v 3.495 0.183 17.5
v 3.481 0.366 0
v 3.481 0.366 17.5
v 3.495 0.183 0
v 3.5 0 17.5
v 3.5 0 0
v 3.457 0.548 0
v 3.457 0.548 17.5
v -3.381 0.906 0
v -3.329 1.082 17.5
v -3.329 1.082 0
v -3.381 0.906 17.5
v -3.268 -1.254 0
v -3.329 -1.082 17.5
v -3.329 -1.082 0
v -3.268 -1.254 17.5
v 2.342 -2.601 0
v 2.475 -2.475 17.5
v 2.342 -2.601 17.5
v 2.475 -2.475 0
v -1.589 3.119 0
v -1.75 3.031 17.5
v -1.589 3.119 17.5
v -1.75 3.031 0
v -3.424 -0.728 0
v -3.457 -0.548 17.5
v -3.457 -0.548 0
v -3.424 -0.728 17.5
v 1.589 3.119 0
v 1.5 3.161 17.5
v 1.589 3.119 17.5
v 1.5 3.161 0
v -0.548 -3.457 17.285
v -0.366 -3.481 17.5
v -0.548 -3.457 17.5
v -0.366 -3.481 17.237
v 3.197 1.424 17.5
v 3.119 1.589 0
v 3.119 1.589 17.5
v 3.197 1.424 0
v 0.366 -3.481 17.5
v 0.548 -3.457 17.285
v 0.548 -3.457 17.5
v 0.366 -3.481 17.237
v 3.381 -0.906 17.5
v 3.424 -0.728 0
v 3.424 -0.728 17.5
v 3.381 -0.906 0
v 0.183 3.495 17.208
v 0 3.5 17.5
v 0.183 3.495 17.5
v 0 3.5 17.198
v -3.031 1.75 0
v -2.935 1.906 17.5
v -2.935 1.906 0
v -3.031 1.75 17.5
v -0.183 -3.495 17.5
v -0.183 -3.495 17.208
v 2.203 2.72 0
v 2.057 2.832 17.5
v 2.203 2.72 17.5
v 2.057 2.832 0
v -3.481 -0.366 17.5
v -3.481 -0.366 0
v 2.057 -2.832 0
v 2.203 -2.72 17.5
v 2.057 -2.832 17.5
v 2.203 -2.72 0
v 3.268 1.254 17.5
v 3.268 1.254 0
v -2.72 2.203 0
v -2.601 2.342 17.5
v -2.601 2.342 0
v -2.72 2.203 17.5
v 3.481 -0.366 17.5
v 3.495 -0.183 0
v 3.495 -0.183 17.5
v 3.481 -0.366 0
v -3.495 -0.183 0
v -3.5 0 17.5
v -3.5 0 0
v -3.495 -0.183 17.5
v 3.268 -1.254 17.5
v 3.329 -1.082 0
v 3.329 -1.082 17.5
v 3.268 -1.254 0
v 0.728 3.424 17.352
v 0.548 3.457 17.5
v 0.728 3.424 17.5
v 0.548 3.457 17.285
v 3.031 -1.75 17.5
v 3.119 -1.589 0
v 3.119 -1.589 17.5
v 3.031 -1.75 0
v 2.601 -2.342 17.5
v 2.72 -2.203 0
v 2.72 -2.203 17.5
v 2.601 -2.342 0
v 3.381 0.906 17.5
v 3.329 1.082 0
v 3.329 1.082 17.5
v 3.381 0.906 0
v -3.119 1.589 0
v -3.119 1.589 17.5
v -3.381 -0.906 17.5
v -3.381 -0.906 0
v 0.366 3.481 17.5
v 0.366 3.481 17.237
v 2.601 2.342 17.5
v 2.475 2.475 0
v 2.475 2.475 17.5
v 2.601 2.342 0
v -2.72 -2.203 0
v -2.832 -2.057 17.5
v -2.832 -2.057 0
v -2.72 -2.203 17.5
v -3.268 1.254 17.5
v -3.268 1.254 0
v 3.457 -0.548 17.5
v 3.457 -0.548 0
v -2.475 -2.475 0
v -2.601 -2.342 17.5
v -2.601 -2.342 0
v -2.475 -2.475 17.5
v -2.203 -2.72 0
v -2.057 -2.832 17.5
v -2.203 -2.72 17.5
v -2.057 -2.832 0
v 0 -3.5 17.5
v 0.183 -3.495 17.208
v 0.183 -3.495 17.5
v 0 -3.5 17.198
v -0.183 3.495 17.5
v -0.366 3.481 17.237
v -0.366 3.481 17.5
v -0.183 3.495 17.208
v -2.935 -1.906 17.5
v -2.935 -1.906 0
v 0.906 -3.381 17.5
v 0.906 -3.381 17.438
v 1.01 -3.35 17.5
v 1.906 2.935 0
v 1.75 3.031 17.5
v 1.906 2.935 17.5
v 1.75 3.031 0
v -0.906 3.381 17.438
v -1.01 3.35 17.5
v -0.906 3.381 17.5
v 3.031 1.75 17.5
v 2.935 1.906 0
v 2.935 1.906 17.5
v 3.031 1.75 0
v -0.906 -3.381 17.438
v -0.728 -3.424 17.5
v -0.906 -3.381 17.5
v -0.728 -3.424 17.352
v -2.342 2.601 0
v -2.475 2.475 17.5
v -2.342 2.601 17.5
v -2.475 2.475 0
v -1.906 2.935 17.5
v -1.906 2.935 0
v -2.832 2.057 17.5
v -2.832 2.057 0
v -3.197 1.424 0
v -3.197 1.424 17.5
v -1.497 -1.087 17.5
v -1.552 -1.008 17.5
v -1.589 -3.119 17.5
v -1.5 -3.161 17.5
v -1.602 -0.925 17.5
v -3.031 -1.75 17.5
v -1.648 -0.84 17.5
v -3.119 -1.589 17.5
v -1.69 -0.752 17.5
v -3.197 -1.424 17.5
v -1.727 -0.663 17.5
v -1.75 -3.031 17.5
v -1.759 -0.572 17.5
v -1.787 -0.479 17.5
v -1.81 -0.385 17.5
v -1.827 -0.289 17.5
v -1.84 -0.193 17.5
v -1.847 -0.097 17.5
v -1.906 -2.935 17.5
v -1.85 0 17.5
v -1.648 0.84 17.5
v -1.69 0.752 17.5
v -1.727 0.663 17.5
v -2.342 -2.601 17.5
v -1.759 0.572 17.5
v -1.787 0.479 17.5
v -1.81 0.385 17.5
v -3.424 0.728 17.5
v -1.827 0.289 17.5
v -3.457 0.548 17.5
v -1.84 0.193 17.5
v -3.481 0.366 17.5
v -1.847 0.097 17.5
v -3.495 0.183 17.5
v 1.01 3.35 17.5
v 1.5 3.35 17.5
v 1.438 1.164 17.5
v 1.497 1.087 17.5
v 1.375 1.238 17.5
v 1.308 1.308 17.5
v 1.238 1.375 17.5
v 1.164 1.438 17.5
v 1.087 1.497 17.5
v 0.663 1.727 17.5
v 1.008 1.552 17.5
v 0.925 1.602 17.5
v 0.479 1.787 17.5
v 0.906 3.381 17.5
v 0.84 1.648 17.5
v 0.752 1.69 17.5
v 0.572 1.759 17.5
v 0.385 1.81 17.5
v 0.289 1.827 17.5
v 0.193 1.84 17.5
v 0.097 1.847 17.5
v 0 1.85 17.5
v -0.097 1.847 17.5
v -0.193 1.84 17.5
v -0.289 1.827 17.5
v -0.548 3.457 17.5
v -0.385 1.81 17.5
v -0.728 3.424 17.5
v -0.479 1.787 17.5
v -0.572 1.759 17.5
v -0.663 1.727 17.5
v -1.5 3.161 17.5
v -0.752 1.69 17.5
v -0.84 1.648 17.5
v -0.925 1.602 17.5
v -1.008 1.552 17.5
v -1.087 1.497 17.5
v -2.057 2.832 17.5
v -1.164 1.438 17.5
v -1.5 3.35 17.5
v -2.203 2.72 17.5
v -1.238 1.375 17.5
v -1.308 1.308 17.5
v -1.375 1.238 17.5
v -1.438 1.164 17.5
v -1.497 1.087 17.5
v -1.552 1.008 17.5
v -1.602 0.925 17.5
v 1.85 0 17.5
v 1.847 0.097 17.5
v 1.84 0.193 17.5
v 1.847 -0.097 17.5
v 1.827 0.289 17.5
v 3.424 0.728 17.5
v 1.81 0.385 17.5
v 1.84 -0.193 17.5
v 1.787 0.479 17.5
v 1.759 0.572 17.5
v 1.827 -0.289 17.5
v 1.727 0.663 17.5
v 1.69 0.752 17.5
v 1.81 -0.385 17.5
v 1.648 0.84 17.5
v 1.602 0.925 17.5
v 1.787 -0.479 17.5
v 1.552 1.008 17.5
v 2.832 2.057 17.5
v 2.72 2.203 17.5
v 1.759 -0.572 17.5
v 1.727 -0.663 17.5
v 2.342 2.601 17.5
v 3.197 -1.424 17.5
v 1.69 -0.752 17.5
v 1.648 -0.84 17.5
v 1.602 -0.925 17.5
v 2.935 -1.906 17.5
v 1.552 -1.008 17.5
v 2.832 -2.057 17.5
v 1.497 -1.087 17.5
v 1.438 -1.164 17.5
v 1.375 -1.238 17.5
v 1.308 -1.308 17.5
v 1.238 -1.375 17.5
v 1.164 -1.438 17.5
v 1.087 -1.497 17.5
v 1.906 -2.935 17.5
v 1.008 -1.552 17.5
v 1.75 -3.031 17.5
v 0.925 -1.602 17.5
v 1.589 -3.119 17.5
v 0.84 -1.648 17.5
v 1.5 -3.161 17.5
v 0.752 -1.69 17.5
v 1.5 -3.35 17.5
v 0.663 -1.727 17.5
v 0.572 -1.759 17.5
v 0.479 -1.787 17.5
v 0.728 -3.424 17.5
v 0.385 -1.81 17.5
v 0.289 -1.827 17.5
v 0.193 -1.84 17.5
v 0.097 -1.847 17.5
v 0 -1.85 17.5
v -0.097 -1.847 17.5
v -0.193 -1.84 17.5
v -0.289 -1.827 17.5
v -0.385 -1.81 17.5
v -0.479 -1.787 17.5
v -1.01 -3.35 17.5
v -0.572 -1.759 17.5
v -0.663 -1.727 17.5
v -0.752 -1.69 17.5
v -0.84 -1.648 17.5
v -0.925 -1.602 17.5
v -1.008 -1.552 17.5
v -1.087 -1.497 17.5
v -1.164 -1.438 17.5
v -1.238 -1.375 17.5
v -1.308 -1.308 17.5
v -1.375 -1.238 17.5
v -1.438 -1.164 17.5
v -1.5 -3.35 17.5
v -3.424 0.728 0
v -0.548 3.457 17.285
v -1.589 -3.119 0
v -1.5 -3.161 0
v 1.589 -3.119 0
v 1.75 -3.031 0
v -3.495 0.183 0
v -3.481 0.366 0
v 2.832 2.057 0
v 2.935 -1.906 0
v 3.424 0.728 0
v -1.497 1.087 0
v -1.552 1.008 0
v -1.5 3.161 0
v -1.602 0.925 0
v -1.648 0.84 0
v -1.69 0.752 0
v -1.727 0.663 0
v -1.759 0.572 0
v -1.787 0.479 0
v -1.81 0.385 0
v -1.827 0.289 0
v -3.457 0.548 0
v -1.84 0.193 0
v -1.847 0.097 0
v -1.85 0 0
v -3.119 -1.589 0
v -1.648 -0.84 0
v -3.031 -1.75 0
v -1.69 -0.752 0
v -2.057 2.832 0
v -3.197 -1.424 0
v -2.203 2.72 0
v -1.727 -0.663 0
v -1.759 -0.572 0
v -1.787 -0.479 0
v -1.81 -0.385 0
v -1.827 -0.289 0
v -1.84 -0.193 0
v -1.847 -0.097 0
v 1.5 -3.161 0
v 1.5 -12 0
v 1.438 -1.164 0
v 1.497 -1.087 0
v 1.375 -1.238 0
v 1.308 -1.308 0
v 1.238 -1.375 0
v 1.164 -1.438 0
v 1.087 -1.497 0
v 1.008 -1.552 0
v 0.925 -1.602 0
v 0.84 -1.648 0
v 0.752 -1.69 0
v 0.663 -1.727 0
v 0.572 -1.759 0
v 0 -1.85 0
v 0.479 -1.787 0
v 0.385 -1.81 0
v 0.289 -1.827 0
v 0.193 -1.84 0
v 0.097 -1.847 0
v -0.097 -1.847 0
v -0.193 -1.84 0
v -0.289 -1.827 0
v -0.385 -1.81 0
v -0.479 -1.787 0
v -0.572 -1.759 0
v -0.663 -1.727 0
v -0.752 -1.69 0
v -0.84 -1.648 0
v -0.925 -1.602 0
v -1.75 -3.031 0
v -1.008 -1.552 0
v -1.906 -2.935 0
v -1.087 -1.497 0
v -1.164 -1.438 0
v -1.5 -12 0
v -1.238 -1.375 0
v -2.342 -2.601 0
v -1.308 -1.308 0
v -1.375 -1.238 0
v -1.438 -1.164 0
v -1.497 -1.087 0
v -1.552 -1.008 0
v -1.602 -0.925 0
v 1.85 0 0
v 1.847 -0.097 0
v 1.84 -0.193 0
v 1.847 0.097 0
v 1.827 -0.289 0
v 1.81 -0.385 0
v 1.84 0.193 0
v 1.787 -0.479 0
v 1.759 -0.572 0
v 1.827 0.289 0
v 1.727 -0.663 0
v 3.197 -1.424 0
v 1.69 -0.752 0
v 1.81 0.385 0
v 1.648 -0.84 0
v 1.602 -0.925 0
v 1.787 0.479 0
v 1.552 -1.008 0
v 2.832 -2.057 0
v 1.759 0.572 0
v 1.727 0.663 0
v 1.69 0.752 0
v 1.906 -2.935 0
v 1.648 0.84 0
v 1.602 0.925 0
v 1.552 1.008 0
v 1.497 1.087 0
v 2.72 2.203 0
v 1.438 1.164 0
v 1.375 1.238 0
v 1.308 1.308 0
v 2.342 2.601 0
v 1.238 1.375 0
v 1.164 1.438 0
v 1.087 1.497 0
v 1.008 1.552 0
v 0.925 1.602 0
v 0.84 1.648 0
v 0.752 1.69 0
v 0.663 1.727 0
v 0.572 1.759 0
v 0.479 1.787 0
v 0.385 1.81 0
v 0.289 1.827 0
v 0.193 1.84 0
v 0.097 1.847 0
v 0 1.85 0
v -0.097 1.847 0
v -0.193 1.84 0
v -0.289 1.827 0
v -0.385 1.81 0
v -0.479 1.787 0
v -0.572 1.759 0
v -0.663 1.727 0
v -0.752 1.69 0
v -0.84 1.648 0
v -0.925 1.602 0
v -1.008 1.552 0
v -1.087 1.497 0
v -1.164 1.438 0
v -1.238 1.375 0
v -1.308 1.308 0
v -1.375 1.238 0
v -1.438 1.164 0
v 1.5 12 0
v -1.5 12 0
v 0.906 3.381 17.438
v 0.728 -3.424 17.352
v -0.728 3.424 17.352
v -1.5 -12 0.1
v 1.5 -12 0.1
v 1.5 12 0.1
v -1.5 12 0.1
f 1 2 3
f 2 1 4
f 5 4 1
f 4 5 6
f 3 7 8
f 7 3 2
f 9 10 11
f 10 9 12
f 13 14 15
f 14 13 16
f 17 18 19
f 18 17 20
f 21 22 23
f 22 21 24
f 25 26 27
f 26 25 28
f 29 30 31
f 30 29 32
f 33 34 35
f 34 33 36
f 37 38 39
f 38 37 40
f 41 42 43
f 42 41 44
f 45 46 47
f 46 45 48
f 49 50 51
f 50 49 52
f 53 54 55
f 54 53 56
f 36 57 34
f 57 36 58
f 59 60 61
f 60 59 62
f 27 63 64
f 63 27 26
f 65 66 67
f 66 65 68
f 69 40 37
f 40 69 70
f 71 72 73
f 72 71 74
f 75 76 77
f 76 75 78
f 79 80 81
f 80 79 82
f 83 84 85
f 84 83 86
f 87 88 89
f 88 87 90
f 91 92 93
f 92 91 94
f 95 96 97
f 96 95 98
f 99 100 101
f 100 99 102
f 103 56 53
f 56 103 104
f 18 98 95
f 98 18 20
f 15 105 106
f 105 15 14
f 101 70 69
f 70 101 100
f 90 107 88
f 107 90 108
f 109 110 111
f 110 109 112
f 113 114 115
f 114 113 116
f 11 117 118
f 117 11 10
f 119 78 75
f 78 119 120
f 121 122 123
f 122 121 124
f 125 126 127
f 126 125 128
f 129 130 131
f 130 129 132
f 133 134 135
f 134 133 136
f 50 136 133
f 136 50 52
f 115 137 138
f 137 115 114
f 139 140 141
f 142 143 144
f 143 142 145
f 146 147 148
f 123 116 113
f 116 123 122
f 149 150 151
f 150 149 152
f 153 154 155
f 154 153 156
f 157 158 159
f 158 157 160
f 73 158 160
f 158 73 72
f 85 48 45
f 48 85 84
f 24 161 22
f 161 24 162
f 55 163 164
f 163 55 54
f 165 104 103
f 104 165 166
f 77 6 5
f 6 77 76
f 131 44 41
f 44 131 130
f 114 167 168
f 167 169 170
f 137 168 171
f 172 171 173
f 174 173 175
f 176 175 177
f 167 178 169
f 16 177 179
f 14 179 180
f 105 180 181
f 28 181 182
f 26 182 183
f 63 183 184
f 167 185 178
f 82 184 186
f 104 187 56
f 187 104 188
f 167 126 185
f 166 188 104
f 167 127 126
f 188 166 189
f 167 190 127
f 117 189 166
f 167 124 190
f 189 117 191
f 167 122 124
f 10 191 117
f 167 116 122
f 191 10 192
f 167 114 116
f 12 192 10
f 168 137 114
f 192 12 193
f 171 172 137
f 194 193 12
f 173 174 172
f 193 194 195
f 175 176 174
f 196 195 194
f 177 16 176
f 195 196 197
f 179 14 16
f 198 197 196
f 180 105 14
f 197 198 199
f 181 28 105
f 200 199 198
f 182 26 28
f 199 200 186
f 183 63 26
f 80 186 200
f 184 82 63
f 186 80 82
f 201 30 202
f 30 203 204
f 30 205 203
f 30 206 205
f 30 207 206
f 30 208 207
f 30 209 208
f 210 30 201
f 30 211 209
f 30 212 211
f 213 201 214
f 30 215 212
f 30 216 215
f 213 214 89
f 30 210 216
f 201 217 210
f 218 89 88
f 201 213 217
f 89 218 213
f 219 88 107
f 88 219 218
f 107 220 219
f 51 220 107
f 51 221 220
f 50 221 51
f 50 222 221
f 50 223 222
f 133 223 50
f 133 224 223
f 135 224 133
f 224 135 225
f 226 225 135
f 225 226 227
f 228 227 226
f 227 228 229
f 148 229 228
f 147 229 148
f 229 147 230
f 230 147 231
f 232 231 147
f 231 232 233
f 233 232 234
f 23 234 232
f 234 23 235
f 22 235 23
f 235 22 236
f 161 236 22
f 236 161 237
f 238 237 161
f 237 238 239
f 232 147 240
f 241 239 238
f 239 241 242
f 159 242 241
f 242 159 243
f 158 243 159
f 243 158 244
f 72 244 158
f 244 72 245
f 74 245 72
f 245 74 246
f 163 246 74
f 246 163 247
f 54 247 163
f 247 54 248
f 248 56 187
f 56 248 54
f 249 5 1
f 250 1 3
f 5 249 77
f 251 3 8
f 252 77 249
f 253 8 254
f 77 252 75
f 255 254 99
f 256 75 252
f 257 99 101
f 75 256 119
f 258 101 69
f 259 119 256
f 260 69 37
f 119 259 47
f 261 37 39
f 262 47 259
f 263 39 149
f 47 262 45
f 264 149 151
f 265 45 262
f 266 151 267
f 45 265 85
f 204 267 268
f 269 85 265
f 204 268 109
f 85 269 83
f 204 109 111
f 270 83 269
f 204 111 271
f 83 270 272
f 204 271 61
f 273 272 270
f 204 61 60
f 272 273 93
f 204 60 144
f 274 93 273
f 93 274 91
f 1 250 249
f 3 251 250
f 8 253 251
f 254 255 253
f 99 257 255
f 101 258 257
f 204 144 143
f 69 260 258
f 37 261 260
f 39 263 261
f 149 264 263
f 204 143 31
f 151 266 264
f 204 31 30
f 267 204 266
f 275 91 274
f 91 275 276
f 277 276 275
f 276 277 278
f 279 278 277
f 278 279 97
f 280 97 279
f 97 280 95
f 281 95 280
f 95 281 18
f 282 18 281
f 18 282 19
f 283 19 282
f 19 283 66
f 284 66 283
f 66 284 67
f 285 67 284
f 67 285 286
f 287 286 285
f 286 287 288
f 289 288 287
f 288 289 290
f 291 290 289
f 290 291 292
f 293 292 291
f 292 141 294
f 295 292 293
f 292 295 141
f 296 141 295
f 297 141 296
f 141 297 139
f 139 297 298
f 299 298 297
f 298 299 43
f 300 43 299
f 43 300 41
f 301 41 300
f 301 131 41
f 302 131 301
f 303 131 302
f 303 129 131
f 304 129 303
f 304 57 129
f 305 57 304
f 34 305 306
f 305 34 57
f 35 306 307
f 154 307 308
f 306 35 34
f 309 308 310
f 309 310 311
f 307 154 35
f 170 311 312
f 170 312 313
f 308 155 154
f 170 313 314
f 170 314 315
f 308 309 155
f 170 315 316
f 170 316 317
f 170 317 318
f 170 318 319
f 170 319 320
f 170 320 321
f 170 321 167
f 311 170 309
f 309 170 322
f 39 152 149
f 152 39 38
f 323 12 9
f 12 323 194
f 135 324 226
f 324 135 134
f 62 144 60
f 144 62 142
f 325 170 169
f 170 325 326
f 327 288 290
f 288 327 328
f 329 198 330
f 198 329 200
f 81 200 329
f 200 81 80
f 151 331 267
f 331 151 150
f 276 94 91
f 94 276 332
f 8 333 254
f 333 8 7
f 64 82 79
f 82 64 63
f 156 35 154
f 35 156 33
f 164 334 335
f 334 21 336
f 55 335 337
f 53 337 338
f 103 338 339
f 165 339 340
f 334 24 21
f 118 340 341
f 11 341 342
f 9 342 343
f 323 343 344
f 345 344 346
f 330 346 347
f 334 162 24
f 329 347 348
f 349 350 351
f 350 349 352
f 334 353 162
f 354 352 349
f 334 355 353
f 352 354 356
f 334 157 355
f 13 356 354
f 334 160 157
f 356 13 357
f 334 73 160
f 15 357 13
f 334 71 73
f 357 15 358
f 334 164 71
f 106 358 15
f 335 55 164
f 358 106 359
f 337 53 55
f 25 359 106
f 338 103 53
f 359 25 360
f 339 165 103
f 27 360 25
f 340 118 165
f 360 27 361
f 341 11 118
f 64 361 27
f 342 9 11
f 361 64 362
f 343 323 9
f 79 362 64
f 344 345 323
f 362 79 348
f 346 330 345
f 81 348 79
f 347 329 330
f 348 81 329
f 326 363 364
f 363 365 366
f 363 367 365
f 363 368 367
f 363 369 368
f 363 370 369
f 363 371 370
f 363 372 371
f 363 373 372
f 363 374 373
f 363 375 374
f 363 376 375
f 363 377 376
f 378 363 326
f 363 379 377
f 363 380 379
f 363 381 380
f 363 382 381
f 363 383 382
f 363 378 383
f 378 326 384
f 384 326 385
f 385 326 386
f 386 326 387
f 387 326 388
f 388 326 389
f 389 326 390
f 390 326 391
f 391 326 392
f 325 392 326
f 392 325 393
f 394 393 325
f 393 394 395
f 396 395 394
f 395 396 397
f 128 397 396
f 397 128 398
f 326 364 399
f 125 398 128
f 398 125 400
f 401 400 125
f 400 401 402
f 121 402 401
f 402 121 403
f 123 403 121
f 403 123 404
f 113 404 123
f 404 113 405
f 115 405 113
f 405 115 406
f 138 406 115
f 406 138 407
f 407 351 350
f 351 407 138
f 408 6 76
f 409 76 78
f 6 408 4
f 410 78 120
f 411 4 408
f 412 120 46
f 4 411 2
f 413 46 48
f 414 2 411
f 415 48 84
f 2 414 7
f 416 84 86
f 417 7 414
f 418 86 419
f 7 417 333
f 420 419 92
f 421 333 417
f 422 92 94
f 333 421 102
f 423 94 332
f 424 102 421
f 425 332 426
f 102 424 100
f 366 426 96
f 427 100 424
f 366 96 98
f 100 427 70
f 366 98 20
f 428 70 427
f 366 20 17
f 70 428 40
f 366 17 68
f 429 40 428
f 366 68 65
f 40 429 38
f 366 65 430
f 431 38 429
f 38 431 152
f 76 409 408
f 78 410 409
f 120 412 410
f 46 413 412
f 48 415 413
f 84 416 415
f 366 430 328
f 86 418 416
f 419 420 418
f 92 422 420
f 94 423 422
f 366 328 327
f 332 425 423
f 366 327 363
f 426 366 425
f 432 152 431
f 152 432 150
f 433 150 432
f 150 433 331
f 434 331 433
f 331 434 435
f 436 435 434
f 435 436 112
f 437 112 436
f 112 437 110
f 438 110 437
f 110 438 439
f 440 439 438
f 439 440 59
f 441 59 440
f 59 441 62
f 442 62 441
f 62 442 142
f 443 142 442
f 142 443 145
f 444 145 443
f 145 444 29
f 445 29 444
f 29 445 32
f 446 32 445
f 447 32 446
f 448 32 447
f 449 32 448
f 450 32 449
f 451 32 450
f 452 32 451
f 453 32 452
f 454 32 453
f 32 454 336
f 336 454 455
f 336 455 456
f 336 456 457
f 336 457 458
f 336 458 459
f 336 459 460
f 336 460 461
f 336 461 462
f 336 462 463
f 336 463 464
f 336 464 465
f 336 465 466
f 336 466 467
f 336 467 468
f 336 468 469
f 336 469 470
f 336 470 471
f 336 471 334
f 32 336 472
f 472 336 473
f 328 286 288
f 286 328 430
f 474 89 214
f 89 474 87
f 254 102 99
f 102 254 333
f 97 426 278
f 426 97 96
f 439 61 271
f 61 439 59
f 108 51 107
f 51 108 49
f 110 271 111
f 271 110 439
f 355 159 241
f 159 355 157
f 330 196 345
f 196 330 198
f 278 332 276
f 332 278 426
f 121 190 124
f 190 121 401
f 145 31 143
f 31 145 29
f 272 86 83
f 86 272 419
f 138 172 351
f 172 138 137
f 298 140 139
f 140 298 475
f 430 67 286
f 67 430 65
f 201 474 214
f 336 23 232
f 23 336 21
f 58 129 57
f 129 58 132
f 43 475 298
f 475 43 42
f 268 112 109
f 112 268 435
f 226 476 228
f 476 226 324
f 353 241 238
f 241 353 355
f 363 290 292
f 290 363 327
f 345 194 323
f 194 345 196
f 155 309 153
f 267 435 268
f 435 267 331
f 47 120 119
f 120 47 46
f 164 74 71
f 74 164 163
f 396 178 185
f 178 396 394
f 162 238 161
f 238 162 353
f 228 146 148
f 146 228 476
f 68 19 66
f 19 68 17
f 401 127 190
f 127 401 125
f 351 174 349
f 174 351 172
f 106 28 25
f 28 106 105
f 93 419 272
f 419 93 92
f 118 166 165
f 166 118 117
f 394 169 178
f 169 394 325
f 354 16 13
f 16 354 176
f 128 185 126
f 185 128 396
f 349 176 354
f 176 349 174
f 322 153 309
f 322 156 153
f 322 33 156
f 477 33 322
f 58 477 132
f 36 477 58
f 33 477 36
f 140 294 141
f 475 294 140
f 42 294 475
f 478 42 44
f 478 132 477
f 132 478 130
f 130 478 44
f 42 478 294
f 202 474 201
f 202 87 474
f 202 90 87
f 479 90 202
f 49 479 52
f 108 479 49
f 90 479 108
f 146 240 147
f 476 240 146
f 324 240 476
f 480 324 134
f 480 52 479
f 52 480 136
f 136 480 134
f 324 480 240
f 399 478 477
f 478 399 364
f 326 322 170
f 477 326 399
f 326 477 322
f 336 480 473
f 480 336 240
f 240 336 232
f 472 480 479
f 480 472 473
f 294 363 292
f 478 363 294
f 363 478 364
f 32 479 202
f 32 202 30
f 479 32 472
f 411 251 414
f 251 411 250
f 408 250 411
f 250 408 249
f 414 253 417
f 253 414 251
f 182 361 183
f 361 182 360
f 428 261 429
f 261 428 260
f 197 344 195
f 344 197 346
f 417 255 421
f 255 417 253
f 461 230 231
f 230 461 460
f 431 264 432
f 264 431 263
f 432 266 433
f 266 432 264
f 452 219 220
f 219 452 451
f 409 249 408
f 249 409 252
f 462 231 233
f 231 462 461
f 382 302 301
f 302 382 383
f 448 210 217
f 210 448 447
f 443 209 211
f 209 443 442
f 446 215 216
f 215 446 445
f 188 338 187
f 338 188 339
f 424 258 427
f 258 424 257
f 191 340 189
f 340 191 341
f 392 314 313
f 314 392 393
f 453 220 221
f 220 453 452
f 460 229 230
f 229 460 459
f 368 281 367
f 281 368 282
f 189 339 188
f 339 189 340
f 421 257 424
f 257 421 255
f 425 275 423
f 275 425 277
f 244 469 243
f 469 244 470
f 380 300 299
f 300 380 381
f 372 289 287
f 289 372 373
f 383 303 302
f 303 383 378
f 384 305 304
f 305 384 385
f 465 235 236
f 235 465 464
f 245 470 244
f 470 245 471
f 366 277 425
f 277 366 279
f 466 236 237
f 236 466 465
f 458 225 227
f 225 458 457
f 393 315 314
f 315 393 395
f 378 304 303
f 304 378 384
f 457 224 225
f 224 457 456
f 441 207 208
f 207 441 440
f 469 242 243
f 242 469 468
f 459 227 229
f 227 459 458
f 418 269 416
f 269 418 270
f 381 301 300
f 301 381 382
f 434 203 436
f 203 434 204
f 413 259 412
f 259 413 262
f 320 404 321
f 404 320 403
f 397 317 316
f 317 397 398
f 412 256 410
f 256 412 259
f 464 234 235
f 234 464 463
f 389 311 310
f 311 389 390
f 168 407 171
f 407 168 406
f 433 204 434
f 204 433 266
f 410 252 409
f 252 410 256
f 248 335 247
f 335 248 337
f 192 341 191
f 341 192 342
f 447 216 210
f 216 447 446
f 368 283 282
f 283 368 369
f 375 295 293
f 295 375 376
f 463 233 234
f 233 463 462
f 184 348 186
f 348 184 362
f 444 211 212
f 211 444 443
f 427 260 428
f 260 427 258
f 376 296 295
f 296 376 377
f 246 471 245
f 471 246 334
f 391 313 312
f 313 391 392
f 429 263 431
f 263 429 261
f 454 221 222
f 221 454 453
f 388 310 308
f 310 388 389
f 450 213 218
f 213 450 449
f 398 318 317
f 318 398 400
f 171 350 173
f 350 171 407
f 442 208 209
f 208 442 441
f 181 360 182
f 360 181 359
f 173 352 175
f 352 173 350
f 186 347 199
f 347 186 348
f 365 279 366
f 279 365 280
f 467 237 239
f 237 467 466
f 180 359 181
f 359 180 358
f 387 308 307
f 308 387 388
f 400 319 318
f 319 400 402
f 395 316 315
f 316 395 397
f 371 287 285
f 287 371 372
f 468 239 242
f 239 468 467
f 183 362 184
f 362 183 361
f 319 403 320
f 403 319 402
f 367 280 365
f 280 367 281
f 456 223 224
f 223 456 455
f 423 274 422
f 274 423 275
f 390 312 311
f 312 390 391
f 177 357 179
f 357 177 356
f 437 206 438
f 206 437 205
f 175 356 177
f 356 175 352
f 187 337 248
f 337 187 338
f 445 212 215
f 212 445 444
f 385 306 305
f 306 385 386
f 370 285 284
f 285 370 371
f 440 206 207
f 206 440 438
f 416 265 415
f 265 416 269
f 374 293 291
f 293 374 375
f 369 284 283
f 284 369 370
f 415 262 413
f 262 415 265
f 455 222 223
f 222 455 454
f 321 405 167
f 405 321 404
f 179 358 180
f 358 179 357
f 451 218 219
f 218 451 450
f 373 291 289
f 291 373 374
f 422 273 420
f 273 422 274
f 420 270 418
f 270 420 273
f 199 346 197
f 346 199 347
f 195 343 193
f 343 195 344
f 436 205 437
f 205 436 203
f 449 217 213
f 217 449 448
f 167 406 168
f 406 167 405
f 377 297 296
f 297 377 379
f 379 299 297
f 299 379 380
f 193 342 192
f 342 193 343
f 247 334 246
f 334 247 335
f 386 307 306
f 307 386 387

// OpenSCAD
my_nbfaces=120;

radius_splitflap = 34.5;
card_width = 39.5;

/* rotor 2 */

ext_border = 3;
int_border = 5;
stator_thickness = 3.5;
wall_thickness = 1.2;
interfacing_thickness = 1.7;
rotor1_wall_height = 7;
axis_base_radius = 8;
axis_top_radius = 5.2;

hole_radius = 1.2;
slack = 0.5;

min_interfacing_high = 16;
max_interfacing_high = 20.5;

stand_thickness = 3;
stand_height=17.5;
stand_radius=3.5;
screw_radius=1.6;

stand_base_length = 24;

motor_radius=14;
motor_height=19;
screw_distance=35;

difference() {
    union() {
        /* motor stand */
        cylinder(r=stand_radius, h=stand_height, $fn=my_nbfaces);
        hull() {
            translate([-stand_thickness/2, -stand_base_length/2, 0])
                cube([stand_thickness, stand_base_length, 0.1]);
            translate([-stand_thickness/2, -stand_radius+0.15, stand_height - 0.1])
                cube([stand_thickness, (stand_radius-0.15)*2, 0.1]);
        }
    }                
    /* screws*/
    cylinder(r=screw_radius+slack/2, h=stand_height + stator_thickness + 2, $fn=my_nbfaces);
 }
